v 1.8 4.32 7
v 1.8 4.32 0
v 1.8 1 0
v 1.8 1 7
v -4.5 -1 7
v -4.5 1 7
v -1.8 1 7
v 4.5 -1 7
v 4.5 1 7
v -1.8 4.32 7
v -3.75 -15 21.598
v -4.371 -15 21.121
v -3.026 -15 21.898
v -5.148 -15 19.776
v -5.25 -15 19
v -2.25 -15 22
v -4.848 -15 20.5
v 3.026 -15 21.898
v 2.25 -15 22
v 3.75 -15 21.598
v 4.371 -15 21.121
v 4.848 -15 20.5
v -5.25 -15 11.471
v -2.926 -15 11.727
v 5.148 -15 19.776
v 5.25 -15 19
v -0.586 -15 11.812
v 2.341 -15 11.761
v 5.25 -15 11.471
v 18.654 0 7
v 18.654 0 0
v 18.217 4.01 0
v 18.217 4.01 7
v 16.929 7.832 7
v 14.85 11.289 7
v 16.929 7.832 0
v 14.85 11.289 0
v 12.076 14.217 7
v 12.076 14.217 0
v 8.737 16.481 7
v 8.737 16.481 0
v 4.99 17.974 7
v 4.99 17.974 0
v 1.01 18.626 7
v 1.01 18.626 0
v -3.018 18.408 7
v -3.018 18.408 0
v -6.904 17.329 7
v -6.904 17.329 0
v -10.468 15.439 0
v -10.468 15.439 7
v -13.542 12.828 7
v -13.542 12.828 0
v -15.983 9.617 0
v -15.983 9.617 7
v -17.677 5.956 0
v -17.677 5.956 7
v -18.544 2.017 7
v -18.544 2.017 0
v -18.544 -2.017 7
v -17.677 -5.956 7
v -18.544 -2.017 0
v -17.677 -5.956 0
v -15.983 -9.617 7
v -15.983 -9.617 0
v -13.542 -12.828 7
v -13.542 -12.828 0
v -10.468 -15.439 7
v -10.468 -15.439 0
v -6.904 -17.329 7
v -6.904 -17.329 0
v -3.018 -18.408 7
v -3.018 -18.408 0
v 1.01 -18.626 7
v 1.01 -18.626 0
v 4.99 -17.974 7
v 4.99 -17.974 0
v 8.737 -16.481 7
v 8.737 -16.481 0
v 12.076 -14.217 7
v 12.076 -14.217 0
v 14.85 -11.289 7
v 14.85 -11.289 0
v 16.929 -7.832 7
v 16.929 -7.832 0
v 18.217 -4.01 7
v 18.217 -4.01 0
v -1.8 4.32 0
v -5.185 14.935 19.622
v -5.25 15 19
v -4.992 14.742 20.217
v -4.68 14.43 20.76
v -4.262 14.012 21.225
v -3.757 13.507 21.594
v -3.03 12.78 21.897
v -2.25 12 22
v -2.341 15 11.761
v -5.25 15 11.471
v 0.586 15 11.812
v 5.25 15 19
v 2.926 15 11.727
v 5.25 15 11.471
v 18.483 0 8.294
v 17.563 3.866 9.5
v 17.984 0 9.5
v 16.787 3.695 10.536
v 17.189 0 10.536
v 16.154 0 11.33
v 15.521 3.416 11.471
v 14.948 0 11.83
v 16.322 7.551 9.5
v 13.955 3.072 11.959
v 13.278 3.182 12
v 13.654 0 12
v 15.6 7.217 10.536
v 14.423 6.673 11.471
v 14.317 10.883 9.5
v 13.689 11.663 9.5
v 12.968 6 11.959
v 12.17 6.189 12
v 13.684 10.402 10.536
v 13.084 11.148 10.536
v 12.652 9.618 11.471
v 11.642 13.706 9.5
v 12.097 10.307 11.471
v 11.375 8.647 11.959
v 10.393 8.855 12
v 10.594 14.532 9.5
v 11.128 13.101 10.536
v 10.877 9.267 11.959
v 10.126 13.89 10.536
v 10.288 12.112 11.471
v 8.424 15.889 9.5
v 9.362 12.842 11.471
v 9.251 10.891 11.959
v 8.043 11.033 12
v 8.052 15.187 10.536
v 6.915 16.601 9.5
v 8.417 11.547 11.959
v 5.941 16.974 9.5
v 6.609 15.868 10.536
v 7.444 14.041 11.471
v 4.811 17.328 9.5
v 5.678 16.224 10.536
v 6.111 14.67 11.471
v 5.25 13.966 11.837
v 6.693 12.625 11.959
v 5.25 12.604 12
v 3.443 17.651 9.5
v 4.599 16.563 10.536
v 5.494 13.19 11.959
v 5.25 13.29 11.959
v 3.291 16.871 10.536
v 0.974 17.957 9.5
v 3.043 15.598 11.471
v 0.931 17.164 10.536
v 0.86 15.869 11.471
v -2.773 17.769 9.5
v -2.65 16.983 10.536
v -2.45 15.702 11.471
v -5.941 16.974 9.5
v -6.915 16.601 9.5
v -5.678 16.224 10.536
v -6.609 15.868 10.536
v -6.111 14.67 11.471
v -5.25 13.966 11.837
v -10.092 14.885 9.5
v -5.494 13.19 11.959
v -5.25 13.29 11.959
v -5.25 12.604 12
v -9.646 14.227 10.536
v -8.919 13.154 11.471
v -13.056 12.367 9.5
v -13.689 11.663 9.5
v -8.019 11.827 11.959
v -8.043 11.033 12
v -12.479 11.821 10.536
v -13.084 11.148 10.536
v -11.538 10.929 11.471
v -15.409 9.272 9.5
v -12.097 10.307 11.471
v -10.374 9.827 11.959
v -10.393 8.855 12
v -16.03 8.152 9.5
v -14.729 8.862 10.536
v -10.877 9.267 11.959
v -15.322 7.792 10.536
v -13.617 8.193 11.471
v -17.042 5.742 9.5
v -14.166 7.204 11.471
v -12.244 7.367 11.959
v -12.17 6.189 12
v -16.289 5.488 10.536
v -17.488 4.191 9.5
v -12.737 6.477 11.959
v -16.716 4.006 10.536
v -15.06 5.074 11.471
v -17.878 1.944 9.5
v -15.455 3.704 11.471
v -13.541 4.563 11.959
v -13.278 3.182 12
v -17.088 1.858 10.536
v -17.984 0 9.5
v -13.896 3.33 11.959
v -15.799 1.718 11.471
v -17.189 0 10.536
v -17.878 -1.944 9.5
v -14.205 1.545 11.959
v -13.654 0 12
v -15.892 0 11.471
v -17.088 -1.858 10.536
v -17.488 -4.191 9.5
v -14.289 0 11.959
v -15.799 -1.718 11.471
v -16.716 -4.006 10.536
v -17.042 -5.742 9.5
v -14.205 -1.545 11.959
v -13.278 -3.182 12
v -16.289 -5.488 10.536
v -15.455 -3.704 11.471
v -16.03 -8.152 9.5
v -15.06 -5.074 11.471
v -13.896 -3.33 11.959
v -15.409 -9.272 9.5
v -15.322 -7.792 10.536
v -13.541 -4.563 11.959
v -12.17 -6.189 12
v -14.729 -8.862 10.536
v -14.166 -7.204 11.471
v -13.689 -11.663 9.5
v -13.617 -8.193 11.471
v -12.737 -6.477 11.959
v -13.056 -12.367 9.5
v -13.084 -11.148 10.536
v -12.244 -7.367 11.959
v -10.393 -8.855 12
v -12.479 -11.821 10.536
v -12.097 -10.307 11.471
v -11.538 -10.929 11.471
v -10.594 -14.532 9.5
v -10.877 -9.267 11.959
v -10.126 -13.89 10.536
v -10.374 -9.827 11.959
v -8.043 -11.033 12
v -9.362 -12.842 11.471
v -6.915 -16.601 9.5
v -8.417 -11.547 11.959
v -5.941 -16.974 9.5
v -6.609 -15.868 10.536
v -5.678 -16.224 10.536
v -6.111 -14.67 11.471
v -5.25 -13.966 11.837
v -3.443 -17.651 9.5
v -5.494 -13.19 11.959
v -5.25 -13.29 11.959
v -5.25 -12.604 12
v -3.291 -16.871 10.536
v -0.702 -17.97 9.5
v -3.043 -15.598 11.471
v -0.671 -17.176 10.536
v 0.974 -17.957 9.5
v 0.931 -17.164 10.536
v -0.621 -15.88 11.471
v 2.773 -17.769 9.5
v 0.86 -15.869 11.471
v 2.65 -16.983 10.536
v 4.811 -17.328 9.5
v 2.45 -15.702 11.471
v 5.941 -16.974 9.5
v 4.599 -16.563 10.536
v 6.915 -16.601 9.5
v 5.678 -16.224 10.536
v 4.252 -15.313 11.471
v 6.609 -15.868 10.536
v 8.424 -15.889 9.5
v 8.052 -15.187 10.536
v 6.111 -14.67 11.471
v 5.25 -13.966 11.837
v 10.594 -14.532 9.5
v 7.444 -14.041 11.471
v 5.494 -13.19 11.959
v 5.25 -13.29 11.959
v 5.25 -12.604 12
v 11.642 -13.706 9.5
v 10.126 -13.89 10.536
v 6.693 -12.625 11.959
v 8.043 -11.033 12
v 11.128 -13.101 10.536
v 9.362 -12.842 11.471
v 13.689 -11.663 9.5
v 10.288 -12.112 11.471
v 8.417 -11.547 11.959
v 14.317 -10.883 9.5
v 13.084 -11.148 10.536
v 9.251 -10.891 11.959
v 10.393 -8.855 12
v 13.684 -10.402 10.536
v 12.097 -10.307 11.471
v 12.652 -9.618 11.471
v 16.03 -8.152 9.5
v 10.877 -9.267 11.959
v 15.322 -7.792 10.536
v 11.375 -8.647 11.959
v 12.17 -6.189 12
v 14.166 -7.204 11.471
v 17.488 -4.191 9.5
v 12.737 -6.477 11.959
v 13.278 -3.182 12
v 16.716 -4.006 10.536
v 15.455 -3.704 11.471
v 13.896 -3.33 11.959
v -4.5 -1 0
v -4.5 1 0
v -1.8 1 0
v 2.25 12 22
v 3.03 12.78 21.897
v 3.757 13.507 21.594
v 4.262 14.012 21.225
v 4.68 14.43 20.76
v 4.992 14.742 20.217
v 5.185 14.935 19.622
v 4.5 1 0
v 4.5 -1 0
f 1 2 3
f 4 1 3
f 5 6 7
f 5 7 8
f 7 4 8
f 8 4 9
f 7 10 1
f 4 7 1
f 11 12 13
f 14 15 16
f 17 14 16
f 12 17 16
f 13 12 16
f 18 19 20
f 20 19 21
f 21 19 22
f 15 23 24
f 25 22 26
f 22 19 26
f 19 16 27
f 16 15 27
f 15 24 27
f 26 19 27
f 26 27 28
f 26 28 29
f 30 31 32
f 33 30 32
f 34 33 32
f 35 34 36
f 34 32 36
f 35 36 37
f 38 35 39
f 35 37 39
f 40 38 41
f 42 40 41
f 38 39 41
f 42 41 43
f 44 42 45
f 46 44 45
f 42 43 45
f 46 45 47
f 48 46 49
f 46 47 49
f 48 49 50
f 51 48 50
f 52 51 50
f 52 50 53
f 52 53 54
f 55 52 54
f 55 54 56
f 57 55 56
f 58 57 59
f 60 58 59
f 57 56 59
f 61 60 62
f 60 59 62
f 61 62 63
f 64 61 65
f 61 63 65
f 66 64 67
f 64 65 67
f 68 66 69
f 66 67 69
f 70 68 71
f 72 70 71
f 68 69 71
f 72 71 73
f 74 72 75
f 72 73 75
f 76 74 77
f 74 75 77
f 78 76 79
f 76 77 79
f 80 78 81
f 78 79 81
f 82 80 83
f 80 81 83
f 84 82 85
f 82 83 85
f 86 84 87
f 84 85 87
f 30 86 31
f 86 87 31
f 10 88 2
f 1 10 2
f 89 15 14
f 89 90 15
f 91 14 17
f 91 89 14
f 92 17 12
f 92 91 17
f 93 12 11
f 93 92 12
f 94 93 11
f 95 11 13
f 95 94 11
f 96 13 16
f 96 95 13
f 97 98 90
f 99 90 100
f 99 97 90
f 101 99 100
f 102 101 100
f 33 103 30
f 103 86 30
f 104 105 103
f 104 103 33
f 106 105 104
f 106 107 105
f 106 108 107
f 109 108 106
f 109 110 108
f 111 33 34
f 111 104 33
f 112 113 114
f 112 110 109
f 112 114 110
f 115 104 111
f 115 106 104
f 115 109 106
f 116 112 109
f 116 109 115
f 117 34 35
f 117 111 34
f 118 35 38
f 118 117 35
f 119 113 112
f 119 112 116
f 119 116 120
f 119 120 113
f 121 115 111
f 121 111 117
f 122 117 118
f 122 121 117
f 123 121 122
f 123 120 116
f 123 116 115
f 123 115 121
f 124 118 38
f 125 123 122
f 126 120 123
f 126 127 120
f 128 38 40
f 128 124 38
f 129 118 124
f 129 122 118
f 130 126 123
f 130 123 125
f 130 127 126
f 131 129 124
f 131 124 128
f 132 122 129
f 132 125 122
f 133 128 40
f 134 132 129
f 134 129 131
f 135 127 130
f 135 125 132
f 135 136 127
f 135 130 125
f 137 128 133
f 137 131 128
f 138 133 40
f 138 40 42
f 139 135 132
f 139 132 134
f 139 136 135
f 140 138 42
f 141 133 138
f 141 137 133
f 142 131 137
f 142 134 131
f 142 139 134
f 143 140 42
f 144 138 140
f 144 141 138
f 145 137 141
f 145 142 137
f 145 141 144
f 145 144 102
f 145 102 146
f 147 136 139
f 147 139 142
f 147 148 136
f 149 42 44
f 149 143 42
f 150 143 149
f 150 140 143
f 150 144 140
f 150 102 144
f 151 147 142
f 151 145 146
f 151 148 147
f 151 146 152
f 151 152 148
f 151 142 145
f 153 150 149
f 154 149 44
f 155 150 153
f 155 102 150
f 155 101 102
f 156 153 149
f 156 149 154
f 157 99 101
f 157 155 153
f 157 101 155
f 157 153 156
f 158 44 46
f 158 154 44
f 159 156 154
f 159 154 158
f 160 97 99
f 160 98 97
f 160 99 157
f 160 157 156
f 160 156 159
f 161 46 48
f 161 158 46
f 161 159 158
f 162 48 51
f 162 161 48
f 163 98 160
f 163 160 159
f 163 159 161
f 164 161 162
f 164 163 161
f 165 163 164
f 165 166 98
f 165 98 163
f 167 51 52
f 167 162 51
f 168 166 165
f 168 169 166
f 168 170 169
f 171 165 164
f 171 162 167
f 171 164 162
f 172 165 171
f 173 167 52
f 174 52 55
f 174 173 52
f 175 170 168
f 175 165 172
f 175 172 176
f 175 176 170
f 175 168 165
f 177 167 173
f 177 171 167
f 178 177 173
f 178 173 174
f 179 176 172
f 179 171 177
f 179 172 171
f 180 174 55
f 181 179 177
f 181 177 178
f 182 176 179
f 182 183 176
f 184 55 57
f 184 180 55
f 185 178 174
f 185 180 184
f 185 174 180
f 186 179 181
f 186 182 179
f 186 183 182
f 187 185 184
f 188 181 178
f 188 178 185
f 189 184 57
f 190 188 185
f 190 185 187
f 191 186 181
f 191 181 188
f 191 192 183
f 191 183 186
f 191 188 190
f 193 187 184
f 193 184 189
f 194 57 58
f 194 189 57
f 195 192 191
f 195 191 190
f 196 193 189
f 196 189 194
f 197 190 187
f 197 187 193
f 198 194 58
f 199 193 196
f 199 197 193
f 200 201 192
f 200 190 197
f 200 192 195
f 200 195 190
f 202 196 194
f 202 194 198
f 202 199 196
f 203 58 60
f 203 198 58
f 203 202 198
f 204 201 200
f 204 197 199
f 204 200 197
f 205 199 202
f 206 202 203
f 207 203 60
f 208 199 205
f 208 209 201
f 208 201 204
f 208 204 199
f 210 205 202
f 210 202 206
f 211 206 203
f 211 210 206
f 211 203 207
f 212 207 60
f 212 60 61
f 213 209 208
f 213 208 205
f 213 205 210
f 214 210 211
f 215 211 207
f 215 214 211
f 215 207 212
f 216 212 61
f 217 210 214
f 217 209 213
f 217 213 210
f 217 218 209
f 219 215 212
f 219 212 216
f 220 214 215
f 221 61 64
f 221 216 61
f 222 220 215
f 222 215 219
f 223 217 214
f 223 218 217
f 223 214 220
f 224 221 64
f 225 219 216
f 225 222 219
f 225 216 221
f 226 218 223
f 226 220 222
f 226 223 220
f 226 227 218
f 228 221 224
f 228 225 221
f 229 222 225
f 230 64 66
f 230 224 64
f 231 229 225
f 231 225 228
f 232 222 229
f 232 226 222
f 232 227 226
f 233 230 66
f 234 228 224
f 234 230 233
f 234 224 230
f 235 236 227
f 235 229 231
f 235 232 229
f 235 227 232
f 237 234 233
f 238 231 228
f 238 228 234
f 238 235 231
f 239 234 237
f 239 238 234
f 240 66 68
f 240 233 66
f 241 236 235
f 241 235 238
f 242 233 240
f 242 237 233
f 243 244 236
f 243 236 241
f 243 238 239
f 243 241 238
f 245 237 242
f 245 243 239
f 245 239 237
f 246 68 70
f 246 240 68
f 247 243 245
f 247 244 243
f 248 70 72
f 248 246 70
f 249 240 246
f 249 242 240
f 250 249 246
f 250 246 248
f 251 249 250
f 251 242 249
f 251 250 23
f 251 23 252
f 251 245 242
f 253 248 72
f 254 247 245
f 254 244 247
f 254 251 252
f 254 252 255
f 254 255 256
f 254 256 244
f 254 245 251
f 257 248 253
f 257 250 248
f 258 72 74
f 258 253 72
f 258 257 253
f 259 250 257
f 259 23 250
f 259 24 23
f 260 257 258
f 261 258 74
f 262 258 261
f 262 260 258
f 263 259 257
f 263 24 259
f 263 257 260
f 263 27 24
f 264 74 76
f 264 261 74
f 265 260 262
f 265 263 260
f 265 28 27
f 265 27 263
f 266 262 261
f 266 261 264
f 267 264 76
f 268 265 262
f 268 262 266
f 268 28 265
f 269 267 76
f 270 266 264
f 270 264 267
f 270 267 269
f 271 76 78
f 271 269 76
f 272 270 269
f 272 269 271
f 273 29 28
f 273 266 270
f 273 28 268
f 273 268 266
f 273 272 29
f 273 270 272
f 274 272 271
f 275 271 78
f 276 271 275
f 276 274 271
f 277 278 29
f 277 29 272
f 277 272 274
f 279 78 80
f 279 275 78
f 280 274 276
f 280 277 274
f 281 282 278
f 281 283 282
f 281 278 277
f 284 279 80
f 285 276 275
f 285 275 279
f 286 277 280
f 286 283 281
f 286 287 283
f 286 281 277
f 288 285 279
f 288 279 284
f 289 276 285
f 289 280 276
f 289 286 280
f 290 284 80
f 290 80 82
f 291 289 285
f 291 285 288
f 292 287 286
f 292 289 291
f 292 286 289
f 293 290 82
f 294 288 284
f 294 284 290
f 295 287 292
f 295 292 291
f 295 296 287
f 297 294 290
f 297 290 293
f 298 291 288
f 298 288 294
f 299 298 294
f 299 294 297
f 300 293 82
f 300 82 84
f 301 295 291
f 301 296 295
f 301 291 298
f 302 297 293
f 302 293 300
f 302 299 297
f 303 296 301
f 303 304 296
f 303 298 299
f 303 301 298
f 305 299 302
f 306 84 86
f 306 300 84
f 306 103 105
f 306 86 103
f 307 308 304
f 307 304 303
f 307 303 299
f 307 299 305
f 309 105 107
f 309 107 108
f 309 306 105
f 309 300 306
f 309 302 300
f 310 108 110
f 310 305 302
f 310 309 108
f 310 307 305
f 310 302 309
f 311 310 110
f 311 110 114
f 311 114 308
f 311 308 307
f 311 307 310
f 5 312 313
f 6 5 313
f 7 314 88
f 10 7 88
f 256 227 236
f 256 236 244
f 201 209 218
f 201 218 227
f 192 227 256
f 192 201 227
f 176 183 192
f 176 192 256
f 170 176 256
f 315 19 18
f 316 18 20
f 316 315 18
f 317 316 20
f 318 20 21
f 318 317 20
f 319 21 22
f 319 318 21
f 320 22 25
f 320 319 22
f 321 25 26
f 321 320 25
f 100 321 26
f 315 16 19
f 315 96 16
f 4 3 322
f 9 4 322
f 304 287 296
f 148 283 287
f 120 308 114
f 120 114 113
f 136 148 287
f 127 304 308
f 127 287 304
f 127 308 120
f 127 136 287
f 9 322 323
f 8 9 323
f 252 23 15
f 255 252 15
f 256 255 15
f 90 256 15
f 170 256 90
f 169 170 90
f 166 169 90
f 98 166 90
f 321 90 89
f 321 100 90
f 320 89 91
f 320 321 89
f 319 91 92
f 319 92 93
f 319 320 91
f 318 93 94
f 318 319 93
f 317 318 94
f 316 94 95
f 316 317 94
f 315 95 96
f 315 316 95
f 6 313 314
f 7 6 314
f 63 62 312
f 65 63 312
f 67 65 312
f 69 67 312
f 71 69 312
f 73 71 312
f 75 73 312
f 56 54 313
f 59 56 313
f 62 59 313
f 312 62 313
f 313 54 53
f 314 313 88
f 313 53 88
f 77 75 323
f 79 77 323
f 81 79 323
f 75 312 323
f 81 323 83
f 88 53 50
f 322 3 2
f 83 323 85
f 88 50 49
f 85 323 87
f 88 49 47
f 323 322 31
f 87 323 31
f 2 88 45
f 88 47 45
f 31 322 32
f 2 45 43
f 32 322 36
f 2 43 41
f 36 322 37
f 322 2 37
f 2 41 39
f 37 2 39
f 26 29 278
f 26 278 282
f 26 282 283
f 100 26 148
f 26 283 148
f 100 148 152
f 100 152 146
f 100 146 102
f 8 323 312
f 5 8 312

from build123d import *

# Parameters (mm, degrees)
F0_R     = 7
F1_DEPTH = 12
F0_R_2   = 18.6535272591
F2_DEPTH = 12
F3_R     = 5
F5_W     = 10.5
F5_H     = 30
F6_DEPTH = 15
F7_R     = 3


# Not quite as in the source:
# - a feature names something its author has since deleted; it is built from what else it names


with BuildPart() as f1:
    # F0 (on Top) → F1 (new body)
    with BuildSketch(Plane.XY):
        Circle(F0_R)
        Polygon((1.8, 1), (4.5, 1), (4.5, -1), (1.8, -1), (-1.8, -1), (-4.5, -1), (-4.5, 1), (-1.8, 1), (-1.8, 4.32), (1.8, 4.32), align=None, mode=Mode.SUBTRACT)
    extrude(amount=F1_DEPTH)

    # F0 (on Top) → F2 (join)
    with BuildSketch(Plane.XY):
        Circle(F0_R_2)
        Circle(F0_R, mode=Mode.SUBTRACT)
    extrude(amount=F2_DEPTH)

    # F3
    f3_edges = [f1.edges().sort_by_distance(p)[0] for p in [
        (-18.653527, 0, 12),
    ]]
    fillet(f3_edges, radius=F3_R)

    # F5 (on offset) → F6 (join)
    with BuildSketch(Plane.XY.offset(7)):
        Rectangle(F5_W, F5_H)
    extrude(amount=F6_DEPTH)

    # F7
    f7_edges = [f1.edges().sort_by_distance(p)[0] for p in [
        (0, 15, 22),
        (-5.25, 0, 22),
        (5.25, 0, 22),
    ]]
    fillet(f7_edges, radius=F7_R)


solid = f1.part
